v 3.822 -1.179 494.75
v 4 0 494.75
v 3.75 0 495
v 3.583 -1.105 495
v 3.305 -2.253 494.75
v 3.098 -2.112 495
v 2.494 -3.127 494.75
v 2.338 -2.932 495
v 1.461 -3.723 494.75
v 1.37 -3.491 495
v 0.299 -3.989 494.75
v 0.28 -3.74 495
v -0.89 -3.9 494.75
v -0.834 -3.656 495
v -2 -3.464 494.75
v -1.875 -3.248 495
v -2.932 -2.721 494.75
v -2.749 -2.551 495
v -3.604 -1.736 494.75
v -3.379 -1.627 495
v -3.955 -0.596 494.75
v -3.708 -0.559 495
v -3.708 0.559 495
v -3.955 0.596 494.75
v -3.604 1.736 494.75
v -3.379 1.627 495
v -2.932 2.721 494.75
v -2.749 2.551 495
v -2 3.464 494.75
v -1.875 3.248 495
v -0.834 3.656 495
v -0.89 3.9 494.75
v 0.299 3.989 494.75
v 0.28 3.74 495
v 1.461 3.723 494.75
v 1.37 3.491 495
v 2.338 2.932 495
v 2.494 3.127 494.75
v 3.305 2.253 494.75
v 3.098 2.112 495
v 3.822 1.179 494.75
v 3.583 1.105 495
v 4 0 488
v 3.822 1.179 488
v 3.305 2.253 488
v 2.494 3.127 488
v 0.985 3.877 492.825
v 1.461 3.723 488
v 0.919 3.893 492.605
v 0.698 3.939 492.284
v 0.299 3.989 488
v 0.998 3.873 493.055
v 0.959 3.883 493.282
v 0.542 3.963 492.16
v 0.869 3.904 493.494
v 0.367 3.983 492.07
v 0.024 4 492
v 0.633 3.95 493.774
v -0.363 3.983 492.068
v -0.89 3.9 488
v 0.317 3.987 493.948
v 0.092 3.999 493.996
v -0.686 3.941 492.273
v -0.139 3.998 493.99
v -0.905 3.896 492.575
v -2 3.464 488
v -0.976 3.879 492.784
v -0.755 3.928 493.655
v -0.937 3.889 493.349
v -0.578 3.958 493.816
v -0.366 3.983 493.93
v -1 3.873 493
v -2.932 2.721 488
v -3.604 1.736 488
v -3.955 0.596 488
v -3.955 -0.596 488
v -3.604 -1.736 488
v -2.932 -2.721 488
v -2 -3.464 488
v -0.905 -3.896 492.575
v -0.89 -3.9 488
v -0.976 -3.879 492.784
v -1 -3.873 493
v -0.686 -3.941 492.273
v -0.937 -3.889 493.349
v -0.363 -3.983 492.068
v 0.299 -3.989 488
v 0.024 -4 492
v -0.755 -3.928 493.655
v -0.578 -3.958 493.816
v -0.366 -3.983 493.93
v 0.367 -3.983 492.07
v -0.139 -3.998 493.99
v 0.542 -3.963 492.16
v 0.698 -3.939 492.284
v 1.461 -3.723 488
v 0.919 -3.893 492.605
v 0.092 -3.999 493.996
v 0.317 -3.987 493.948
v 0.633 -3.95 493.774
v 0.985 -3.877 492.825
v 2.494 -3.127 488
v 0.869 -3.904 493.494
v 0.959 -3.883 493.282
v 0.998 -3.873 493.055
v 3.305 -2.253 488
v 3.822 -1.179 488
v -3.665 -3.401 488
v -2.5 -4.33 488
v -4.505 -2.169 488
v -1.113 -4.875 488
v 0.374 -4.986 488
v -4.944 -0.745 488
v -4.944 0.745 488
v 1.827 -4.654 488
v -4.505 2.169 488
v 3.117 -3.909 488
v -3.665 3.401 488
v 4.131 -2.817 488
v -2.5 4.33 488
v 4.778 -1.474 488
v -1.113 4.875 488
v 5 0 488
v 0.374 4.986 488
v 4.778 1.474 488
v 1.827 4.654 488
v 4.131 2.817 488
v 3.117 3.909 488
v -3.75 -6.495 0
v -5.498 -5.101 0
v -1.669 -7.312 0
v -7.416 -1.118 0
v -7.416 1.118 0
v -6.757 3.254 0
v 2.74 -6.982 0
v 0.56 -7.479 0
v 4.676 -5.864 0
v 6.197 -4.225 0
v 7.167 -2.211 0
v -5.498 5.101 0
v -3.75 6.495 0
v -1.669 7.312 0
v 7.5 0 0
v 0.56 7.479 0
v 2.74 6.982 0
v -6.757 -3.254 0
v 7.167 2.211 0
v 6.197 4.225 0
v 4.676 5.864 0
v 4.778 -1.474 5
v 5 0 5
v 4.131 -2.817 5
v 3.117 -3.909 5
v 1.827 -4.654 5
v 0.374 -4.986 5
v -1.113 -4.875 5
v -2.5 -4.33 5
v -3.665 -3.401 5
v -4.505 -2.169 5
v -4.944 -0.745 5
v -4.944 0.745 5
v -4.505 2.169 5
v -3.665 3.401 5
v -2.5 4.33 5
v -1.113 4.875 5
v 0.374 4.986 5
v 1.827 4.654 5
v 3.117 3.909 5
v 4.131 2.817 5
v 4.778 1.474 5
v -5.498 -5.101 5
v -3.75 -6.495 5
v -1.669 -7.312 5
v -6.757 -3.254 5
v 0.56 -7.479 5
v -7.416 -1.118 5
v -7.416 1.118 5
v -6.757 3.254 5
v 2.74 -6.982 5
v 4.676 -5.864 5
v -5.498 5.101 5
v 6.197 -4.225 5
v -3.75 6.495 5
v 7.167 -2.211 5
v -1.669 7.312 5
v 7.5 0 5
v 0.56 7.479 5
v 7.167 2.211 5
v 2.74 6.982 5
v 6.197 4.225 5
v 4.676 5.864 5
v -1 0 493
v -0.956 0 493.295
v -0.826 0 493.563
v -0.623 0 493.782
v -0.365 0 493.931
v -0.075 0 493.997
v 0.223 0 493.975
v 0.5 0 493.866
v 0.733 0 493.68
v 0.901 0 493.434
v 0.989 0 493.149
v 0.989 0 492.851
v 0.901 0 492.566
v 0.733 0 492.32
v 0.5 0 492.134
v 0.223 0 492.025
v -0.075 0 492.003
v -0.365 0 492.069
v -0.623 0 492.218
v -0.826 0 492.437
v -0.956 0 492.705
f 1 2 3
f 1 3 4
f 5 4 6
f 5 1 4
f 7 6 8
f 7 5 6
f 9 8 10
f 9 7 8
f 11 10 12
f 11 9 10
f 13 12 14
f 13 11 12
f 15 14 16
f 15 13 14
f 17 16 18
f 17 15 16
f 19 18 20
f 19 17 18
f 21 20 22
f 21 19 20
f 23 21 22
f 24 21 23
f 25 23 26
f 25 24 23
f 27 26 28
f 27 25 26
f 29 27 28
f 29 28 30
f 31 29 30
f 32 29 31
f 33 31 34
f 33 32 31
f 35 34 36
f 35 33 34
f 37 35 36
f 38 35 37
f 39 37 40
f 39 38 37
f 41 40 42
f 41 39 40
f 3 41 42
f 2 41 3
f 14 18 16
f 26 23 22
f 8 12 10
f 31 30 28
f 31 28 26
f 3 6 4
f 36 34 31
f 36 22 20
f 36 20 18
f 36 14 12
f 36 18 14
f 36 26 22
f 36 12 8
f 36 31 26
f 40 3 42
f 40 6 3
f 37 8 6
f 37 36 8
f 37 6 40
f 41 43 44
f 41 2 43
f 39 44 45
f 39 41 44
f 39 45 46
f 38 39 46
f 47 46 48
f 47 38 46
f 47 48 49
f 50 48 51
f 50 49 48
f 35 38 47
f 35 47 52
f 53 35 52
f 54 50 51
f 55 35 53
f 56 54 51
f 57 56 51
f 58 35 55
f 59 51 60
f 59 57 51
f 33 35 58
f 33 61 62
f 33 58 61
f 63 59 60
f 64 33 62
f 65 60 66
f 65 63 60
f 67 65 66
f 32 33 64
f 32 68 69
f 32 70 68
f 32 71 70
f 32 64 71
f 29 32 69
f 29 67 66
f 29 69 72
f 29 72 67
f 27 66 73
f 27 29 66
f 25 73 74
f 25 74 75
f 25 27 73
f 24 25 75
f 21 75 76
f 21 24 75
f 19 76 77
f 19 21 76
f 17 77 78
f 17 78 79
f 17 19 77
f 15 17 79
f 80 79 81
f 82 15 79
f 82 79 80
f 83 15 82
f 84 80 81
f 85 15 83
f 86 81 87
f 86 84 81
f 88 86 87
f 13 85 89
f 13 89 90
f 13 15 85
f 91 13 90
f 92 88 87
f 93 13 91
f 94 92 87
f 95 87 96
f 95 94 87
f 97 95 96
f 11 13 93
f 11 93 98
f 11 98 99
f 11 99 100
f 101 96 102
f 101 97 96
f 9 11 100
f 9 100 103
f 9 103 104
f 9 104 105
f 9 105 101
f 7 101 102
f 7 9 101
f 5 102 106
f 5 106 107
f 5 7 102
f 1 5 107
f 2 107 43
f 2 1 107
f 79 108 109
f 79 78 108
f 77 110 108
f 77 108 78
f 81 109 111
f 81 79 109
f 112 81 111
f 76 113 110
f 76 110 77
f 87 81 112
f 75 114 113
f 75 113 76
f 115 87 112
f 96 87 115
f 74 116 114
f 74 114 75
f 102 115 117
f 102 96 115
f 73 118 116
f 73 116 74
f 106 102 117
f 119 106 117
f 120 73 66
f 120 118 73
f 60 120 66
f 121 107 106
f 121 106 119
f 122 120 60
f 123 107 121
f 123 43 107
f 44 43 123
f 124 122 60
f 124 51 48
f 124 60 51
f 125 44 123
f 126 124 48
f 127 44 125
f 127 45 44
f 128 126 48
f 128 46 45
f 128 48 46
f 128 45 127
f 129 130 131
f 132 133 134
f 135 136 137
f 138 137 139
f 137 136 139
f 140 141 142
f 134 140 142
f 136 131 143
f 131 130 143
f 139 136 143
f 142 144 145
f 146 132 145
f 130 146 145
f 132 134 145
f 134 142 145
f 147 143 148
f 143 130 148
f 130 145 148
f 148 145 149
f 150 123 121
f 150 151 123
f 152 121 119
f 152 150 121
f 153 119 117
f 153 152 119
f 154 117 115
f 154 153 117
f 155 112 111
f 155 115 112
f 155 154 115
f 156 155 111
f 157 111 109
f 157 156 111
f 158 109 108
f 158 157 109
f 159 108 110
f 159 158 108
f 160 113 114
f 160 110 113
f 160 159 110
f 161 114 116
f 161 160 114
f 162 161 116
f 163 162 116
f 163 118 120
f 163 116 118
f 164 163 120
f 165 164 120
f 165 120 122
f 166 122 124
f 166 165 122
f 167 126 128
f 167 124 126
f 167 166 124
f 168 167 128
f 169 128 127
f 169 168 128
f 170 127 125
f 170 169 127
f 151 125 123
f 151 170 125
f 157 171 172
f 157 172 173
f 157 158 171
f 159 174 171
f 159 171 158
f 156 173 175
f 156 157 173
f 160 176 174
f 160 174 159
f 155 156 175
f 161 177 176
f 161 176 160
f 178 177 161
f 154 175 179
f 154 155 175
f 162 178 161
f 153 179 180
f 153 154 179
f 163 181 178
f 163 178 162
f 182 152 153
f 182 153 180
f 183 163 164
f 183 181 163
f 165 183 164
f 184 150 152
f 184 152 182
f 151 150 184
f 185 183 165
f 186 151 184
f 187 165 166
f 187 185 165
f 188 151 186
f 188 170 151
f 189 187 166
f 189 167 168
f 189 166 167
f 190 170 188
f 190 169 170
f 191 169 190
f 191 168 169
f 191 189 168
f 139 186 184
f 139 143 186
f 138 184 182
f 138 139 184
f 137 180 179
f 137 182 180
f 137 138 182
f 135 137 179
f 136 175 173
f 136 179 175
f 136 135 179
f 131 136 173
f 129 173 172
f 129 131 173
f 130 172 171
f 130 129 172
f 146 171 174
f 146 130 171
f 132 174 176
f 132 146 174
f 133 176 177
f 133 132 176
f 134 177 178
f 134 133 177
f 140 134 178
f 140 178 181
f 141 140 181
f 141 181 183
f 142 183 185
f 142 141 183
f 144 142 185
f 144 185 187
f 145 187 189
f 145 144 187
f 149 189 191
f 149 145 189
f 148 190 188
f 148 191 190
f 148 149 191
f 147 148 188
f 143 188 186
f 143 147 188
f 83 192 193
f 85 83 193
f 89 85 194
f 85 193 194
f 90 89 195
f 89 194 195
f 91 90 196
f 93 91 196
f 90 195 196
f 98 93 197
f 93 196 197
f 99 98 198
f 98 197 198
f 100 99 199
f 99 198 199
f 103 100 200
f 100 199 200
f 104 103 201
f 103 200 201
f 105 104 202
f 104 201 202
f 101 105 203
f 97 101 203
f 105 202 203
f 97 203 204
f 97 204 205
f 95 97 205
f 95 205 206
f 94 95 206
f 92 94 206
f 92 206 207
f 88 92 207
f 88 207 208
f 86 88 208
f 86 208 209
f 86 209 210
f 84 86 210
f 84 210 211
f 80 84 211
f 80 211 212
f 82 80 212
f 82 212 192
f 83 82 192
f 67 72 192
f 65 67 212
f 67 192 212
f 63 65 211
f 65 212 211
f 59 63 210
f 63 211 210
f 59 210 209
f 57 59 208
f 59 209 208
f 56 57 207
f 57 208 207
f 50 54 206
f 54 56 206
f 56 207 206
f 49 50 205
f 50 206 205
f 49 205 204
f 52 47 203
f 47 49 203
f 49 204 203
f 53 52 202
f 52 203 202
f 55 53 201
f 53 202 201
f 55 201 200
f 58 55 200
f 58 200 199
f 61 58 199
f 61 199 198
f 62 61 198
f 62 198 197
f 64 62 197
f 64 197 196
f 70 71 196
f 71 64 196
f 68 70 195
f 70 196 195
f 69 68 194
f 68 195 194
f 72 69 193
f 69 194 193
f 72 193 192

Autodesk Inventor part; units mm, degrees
ref_plane "YZ Plane" through (0, 0, 0) normal (1, 0, 0) x (0, 1, 0)
ref_plane "XZ Plane" through (0, 0, 0) normal (0, 1, 0) x (-1, 0, 0)
ref_plane "XY Plane" through (0, 0, 0) normal (0, 0, 1) x (1, 0, 0)
sketch "草图1" plane through (0, 0, 0) normal (0, 0, 1) x (1, 0, 0)
  circle A0 centre (0, 0) radius 7.5
  dimension "d0" = 15
extrude "拉伸1" add sketch "草图1" along normal blind 5
sketch "草图2" plane through (0, 0, 5) normal (0, 0, 1) x (1, 0, 0)
  circle A0 centre (0, 0) radius 5
  dimension "d3" = 10
extrude "拉伸2" add sketch "草图2" along normal blind 490
sketch "草图3" plane through (0, 0, 0) normal (0, 1, 0) x (-1, 0, 0)
  circle A0 centre (0, 493) radius 1
  line L0 (5, 495) -> (-5, 495) projected
  point P0 (0, 0)
  dimension "d6" = 2
  dimension "d7" = 2
extrude "拉伸3" cut sketch "草图3" along normal through all both and the other way through all
sketch "草图4" plane through (0, 0, 495) normal (0, 0, 1) x (1, 0, 0)
  circle A0 centre (0, 0) radius 4
  circle A1 centre (0, 0) radius 5
  dimension "d15" = 8
  dimension "d16" = 10
extrude "拉伸4" cut sketch "草图4" against normal blind 7
thread "螺纹2" size "M8x1.25" class "6g" standard "ANSI Metric M Profile" full length
chamfer "倒角2" distance 0.25 angle 45 1 edges at (-4, 0, 495)
properties part number "砂轮架固定销"
